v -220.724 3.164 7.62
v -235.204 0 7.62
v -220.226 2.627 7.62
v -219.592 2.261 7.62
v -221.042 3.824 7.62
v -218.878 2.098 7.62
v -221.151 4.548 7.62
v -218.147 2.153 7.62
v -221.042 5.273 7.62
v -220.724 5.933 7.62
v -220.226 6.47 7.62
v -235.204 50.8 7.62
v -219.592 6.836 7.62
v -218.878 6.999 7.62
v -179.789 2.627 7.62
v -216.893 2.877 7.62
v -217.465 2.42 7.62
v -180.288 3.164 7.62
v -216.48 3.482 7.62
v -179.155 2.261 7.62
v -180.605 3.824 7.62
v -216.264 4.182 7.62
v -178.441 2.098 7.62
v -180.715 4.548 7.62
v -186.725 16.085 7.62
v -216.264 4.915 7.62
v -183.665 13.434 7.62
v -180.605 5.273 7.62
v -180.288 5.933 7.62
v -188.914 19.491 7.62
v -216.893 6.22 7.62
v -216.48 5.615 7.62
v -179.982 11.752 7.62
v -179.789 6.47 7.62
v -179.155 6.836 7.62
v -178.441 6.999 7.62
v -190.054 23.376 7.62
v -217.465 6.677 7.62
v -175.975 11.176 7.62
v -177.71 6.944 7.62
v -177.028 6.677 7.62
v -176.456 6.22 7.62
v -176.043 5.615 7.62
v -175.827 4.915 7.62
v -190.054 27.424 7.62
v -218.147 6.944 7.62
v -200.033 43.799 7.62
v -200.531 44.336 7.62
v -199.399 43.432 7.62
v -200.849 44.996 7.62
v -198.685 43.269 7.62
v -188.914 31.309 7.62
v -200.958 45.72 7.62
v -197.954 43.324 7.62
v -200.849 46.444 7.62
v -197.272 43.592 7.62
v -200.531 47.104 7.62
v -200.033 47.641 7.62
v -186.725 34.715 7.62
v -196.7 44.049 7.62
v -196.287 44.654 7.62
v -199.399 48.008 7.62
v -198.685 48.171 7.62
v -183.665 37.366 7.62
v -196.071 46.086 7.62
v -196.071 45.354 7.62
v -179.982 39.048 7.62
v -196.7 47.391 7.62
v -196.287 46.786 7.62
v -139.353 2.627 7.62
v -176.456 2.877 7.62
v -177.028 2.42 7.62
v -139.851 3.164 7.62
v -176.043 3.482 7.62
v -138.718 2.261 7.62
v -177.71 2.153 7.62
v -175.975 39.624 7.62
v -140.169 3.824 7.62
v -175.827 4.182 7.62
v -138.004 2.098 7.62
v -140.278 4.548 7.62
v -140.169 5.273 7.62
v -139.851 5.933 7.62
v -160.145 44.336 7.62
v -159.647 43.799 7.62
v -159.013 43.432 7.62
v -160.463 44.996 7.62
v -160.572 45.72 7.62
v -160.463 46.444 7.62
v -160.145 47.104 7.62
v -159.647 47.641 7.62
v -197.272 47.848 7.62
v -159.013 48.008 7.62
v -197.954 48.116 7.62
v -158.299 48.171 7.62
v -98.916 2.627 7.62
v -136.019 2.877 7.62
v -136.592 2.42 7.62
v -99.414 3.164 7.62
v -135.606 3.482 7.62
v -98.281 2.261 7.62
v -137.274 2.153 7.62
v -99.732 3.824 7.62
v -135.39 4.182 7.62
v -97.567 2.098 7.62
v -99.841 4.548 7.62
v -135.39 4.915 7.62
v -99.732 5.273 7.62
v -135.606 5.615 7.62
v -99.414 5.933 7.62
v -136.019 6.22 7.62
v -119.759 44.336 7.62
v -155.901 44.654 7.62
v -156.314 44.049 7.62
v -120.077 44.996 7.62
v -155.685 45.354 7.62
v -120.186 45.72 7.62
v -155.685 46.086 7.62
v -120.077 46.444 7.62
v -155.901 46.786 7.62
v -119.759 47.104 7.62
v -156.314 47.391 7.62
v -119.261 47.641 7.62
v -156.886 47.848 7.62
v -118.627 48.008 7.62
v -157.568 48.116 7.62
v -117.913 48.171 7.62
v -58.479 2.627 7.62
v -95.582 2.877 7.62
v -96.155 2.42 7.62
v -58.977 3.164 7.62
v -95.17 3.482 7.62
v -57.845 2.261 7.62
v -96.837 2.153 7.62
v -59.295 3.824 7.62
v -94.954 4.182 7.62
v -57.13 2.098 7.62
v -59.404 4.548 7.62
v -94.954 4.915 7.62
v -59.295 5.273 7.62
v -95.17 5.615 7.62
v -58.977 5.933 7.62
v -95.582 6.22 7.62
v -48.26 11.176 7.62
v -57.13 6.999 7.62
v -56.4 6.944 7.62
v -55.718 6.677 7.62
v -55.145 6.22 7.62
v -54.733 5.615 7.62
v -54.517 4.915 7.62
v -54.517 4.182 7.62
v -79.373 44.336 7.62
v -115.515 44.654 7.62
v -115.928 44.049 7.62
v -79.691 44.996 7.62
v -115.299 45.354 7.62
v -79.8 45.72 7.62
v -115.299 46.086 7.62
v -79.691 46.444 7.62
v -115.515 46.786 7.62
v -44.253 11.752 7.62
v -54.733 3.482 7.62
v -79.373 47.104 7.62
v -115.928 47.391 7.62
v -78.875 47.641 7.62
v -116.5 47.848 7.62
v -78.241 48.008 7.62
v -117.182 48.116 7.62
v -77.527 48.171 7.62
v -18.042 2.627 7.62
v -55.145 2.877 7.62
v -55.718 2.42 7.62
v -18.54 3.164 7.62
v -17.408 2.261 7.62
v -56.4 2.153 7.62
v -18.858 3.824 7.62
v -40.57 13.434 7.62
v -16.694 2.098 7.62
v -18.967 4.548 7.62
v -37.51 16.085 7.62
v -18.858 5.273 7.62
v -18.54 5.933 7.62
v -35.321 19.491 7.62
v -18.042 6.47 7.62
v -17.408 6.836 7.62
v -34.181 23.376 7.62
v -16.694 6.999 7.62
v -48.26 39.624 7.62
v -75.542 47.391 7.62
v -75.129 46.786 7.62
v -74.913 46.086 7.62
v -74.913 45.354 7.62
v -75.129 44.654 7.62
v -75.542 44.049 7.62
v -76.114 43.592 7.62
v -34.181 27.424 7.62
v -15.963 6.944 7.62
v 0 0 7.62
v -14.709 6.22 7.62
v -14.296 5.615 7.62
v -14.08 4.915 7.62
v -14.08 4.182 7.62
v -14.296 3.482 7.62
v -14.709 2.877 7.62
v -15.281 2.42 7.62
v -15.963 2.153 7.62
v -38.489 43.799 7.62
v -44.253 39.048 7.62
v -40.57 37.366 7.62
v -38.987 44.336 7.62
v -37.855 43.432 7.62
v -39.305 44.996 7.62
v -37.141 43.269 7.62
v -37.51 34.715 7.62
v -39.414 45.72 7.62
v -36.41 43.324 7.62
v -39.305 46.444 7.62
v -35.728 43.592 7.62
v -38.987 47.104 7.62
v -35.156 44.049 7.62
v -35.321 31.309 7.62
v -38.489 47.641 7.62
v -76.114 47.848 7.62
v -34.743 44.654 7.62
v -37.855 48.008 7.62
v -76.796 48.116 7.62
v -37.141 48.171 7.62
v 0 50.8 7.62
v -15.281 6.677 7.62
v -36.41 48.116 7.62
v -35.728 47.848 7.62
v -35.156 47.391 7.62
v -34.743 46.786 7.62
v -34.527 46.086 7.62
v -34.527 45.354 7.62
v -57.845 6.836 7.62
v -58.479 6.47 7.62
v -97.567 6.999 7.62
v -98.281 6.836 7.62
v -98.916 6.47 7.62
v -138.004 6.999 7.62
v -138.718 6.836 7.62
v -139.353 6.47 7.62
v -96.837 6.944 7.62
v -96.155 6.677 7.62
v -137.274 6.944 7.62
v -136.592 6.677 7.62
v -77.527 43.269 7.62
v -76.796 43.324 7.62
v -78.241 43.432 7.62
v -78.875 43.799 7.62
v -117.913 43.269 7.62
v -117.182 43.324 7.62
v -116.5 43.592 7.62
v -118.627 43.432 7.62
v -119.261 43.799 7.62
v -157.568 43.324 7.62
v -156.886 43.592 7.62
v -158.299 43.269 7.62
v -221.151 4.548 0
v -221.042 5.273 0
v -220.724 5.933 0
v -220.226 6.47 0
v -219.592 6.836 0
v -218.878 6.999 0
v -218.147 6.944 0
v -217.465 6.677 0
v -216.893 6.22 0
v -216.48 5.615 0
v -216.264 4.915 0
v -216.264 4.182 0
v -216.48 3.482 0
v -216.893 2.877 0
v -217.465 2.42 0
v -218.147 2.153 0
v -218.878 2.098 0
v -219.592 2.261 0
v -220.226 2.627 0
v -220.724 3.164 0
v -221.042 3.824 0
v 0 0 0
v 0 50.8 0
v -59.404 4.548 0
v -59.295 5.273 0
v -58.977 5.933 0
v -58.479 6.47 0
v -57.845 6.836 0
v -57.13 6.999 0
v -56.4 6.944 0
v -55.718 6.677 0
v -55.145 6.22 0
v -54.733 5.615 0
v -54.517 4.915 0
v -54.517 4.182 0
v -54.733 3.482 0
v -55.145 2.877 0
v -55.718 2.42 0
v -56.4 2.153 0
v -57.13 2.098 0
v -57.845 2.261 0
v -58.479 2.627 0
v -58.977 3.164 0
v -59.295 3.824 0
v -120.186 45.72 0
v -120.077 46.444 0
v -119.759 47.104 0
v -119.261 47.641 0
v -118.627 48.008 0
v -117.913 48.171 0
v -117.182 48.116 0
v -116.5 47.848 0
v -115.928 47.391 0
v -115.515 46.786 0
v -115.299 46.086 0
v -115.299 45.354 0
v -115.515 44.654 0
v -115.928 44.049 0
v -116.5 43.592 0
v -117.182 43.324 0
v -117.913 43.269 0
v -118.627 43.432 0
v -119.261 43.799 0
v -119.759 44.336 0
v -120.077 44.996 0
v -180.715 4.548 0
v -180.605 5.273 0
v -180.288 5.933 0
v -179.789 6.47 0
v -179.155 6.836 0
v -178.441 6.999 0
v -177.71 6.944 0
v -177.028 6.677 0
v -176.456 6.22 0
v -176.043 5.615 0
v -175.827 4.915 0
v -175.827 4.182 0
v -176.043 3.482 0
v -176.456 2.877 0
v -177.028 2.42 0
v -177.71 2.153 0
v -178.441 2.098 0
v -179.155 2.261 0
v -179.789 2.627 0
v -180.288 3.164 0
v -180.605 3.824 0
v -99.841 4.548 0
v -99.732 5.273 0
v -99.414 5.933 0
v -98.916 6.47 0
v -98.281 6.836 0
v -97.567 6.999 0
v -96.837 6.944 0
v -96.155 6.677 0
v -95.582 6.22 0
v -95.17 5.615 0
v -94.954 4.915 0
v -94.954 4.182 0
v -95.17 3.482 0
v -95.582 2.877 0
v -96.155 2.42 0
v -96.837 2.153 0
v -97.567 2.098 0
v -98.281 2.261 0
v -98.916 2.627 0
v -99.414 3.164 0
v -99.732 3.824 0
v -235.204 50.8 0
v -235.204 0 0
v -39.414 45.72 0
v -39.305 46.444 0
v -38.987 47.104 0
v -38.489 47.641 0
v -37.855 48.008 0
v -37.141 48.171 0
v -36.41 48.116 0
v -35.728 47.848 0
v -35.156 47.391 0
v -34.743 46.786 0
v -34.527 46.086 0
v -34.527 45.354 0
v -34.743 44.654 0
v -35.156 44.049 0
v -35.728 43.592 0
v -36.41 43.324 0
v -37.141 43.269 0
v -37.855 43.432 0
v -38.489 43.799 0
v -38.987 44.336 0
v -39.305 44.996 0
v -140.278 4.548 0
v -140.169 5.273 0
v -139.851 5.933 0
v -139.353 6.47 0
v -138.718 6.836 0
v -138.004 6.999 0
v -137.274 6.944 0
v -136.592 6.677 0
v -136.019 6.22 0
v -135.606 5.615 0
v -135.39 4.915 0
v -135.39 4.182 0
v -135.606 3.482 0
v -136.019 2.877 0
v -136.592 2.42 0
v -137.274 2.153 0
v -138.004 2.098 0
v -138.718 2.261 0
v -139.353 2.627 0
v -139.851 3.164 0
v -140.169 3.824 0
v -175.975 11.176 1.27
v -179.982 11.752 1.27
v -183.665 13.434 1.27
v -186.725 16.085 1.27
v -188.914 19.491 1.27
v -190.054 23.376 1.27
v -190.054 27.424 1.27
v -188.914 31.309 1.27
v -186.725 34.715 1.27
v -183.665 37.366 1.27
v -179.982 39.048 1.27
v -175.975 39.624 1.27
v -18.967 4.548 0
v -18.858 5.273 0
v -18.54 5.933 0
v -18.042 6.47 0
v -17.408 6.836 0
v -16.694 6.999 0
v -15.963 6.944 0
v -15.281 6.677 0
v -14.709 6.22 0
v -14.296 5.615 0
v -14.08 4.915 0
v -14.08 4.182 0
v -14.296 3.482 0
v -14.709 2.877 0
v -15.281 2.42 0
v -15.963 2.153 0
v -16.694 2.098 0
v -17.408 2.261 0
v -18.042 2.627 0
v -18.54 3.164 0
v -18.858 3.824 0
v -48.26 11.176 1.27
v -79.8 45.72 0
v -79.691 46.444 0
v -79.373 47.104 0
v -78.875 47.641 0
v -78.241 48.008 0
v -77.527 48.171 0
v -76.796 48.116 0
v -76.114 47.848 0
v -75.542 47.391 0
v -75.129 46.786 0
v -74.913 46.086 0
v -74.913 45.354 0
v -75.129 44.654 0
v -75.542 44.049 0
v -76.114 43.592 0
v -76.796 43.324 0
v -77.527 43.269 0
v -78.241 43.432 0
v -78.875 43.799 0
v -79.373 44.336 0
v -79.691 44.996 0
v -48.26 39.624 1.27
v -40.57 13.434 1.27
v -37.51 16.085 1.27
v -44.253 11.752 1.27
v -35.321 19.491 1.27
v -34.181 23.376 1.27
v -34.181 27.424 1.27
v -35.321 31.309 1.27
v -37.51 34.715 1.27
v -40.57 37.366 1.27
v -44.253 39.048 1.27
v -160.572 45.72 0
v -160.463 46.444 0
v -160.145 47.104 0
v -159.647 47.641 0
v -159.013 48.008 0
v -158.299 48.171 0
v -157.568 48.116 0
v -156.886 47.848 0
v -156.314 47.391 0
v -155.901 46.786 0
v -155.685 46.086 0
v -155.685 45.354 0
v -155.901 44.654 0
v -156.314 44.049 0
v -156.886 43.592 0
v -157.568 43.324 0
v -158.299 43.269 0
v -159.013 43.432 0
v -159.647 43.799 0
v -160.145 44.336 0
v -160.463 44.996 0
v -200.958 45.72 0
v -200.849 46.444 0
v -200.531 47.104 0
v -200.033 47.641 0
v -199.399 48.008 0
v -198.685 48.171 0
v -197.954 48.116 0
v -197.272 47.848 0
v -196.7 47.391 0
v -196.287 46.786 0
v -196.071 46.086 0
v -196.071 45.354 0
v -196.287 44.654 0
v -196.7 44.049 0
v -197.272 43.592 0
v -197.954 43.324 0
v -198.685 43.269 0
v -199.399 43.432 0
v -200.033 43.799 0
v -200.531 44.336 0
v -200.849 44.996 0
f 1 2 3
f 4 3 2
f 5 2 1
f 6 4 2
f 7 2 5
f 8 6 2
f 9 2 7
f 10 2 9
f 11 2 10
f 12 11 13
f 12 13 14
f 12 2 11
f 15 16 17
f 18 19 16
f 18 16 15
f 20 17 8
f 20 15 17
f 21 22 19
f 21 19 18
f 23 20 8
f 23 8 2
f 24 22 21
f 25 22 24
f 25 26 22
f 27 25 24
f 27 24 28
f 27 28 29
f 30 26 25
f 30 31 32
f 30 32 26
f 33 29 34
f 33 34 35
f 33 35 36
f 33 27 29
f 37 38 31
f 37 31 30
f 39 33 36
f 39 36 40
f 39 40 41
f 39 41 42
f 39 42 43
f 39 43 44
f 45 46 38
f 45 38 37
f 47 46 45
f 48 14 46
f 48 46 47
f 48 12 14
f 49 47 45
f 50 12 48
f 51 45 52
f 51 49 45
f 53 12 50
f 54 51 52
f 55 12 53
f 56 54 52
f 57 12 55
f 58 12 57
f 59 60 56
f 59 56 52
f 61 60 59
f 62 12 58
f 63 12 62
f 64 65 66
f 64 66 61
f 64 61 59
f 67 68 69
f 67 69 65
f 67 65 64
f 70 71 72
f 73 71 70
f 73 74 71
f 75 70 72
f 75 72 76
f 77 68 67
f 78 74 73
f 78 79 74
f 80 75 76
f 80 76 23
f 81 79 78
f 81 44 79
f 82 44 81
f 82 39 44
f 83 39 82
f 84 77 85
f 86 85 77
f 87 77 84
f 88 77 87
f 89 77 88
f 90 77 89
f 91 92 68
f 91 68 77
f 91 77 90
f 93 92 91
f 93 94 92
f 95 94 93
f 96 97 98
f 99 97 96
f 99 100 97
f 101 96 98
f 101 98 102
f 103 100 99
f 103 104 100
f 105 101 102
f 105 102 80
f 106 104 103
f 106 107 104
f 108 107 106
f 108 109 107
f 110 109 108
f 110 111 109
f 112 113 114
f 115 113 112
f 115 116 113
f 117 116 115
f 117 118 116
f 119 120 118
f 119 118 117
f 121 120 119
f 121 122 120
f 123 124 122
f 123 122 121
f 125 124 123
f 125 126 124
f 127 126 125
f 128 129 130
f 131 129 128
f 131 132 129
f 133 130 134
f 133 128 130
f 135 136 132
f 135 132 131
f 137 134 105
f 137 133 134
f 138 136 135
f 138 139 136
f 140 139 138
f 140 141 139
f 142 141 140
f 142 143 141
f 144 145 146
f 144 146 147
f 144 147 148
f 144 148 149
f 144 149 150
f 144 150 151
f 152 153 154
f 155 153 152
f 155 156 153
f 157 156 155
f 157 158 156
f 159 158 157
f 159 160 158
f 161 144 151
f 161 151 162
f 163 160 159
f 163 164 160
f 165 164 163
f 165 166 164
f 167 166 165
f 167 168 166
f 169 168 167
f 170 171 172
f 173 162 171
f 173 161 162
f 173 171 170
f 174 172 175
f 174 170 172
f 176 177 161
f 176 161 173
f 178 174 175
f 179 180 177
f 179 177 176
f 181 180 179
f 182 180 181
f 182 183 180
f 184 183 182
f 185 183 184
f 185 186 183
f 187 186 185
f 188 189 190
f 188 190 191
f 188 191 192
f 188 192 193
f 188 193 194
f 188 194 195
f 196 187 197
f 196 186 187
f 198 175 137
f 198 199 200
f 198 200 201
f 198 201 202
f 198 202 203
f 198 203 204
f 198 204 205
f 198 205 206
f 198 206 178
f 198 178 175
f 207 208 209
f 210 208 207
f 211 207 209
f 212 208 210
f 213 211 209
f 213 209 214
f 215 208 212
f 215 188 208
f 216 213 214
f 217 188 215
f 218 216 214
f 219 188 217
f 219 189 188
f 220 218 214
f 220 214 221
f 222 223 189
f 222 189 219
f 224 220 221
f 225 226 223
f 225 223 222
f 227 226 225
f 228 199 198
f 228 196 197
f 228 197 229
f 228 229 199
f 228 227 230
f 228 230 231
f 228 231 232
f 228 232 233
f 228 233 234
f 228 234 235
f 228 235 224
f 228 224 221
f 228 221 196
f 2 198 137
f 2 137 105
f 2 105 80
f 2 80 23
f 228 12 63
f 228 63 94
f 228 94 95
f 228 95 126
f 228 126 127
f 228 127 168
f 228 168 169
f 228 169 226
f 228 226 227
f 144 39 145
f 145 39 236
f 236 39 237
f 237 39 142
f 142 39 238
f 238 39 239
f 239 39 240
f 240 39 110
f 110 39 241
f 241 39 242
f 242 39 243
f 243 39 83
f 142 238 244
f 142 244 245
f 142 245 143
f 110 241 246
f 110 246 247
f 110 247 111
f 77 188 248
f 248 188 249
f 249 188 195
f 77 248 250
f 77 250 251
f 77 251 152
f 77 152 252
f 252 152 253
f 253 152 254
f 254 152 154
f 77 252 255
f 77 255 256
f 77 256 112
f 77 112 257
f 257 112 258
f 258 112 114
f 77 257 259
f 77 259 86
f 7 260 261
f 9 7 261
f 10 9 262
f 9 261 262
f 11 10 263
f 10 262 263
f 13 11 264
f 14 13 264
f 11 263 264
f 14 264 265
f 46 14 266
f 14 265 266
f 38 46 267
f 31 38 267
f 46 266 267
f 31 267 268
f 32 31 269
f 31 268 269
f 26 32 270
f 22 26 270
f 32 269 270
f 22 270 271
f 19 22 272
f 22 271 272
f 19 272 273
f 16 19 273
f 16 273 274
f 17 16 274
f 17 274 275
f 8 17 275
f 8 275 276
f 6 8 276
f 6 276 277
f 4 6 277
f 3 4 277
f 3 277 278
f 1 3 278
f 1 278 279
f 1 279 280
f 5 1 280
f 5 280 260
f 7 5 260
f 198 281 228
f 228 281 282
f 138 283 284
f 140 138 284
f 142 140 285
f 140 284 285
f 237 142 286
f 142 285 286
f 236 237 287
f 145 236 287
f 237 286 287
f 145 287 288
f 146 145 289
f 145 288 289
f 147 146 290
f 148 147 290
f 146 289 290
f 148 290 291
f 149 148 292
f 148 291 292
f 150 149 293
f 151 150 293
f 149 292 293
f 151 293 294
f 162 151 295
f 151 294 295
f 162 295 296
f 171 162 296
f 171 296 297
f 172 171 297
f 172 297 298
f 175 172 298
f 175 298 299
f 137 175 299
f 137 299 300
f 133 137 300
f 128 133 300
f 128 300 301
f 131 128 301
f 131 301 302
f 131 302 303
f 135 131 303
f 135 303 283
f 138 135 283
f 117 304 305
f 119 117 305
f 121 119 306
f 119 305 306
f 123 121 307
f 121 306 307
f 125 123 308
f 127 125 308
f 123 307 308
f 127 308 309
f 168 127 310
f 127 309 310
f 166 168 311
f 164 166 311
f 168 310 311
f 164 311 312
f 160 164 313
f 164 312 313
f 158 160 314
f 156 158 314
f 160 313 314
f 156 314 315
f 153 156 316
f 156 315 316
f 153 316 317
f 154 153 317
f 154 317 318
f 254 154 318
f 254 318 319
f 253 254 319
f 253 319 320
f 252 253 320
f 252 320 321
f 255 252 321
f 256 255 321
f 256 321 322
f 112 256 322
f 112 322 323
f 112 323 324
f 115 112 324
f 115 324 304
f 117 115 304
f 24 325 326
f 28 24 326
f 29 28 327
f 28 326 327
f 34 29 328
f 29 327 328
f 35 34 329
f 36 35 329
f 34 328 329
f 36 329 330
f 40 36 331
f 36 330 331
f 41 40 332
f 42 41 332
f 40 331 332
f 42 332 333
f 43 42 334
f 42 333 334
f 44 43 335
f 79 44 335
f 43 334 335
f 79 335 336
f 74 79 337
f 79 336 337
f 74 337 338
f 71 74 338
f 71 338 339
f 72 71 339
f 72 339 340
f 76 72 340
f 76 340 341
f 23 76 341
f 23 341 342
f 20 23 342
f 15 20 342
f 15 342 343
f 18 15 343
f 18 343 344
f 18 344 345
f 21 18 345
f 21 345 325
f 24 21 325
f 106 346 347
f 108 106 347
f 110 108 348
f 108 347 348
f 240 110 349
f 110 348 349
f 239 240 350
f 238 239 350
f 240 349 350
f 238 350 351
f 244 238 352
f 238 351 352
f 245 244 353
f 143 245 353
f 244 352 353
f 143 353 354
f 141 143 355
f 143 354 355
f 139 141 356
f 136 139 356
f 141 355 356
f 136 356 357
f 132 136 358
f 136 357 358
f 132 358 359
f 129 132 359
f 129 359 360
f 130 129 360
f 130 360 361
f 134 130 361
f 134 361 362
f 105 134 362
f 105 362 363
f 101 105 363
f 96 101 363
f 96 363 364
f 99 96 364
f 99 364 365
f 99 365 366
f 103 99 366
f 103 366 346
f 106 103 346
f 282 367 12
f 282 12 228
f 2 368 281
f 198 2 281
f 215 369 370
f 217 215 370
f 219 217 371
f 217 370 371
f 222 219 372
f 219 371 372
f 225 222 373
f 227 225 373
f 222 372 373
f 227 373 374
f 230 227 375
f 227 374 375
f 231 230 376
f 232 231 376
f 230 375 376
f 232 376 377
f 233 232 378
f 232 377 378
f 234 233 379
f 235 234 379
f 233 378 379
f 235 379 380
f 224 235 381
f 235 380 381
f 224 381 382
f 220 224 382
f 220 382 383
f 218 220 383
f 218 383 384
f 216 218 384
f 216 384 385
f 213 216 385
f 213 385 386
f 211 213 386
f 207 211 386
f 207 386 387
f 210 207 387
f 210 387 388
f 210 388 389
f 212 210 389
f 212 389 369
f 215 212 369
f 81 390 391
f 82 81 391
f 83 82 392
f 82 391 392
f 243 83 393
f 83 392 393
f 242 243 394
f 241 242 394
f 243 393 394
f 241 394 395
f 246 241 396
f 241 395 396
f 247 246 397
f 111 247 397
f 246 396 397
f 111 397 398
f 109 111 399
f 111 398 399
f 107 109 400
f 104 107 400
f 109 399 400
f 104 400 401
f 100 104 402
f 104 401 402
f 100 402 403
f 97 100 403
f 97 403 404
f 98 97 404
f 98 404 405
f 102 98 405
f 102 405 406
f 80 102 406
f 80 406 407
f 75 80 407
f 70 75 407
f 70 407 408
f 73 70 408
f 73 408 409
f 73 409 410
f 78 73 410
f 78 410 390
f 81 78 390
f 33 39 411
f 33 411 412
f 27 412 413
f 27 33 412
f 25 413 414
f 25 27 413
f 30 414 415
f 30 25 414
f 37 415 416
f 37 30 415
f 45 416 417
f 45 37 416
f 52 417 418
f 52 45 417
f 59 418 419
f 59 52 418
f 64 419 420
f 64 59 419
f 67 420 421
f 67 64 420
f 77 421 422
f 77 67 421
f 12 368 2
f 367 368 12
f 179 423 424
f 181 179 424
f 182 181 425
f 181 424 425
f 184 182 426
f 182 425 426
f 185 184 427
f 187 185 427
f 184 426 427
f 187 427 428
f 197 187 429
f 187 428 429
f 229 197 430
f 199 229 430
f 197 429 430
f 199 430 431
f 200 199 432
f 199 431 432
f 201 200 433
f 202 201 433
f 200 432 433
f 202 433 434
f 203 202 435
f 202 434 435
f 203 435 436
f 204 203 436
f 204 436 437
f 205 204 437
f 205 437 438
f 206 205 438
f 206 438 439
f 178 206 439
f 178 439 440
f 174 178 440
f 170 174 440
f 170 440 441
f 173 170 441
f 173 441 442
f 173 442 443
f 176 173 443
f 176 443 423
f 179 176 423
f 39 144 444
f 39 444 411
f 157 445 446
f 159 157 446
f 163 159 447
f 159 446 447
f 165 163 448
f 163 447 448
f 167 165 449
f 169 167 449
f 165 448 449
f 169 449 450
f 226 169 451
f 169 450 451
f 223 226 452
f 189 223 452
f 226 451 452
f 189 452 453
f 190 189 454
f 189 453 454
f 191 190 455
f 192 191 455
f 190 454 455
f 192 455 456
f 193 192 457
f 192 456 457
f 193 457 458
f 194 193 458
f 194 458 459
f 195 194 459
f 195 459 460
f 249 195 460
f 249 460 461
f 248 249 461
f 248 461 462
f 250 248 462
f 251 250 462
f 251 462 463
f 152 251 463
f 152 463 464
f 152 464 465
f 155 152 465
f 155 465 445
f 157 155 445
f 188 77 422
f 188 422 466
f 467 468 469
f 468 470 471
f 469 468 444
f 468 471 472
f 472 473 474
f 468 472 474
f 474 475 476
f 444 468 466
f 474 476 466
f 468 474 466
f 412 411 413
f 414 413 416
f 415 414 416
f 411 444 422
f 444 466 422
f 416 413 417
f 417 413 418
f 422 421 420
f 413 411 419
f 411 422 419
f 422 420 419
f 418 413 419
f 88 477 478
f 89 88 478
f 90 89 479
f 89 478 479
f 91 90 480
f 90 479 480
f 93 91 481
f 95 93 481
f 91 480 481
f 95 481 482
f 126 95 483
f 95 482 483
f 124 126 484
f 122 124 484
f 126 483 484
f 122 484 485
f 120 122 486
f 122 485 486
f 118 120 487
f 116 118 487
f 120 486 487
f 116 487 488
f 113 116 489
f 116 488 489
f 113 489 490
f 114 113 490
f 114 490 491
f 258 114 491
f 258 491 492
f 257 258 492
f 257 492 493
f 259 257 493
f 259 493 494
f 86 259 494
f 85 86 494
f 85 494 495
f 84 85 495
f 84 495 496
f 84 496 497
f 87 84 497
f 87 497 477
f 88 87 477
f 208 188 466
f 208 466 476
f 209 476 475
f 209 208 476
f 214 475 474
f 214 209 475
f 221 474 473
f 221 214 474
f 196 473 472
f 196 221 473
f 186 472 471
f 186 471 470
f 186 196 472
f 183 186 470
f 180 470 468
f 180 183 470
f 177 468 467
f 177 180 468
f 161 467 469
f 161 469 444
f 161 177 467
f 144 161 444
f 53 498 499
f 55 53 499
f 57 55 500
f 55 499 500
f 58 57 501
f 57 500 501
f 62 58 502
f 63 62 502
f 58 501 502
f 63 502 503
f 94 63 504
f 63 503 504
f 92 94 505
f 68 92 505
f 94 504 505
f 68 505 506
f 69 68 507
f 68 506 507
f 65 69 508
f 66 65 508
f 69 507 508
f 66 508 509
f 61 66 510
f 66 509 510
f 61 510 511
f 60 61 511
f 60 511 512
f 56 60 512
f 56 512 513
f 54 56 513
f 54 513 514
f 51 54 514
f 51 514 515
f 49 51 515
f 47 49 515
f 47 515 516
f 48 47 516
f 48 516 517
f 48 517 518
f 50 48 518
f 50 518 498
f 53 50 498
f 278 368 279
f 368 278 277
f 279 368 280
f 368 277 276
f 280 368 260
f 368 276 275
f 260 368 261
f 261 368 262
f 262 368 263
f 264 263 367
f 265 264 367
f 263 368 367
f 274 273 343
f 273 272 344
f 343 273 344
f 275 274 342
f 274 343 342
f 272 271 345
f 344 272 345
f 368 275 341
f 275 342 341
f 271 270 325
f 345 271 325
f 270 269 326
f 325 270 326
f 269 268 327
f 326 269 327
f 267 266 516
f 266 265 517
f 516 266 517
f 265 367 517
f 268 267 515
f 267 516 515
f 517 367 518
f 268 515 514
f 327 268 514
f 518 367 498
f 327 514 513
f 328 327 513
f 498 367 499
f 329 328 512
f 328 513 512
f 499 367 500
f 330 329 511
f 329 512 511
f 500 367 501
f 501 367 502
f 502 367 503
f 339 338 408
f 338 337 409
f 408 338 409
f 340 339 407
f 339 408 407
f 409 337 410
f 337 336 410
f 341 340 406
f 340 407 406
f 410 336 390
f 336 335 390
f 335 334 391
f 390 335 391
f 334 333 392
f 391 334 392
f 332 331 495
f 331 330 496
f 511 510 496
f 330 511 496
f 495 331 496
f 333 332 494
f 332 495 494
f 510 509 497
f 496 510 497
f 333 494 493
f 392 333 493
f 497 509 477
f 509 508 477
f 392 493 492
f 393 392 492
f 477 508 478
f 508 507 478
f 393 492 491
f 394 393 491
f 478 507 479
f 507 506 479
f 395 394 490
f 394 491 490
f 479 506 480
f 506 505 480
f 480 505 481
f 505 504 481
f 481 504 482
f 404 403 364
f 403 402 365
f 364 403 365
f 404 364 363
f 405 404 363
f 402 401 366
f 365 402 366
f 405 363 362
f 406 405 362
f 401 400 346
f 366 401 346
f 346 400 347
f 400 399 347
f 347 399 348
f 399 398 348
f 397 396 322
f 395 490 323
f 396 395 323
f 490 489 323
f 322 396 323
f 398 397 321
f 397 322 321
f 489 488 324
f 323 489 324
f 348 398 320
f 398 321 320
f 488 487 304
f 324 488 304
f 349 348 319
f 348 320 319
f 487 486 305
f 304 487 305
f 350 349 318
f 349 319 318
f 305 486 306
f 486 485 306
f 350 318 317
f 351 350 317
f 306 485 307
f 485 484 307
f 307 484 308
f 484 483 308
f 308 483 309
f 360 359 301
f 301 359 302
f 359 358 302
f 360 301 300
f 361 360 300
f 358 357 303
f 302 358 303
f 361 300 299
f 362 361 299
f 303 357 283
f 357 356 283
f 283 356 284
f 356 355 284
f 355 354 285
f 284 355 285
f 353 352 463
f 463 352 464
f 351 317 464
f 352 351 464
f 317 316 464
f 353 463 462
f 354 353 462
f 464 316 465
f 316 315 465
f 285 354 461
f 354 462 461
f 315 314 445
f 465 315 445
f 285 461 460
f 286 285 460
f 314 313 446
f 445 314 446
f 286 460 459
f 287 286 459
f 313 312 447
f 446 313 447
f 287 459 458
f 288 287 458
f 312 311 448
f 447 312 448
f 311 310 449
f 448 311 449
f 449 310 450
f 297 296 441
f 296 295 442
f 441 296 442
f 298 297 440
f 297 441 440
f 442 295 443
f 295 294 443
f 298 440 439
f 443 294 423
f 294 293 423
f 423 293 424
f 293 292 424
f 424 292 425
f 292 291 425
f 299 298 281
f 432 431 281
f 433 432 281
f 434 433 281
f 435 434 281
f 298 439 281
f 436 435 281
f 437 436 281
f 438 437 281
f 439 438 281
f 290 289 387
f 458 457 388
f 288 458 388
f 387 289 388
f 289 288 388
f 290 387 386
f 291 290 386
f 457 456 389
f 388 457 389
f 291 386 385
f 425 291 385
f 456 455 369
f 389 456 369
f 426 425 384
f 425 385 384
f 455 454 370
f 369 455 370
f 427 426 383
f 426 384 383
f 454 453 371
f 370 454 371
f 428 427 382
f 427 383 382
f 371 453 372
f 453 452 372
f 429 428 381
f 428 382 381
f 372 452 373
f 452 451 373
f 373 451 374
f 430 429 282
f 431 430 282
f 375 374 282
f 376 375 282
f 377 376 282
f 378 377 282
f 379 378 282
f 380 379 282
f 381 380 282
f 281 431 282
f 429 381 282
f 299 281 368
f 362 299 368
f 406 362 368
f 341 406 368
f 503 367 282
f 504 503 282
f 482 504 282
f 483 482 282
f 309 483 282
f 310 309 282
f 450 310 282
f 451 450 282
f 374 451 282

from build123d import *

# Parameters (mm, degrees)
SKETCH5_W                    = 235.204
SKETCH5_H                    = 50.8
BOSS_EXTRUDE3_DEPTH          = 7.62
CUT_EXTRUDE3_DEPTH           = 6.35
F_10_0_1935_DIAMETER_HOLE1_D = 4.9149


with BuildPart() as part:
    # Sketch5 → Boss-Extrude3 (new body)
    with BuildSketch(Plane.XY):
        with Locations((-117.602, 25.4)):
            Rectangle(SKETCH5_W, SKETCH5_H)
    extrude(amount=BOSS_EXTRUDE3_DEPTH)

    # Sketch6 → Cut-Extrude3 (cut)
    with BuildSketch(Plane.XY.offset(7.62)):
        with BuildLine():
            Line((-48.26, 11.176), (-175.975043584, 11.176))
            ThreePointArc((-175.975043584, 11.176), (-190.199043584, 25.4), (-175.975043584, 39.624))
            Line((-175.975043584, 39.624), (-48.26, 39.624))
            ThreePointArc((-48.26, 39.624), (-34.036, 25.4), (-48.26, 11.176))
        make_face()
    extrude(amount=-CUT_EXTRUDE3_DEPTH, mode=Mode.SUBTRACT)

    # #10 (0.1935) Diameter Hole1 (through all)
    with Locations(Plane(origin=(-198.501, 45.72, 7.62), x_dir=(1, 0, 0), z_dir=(0, 0, 1))):
        with Locations((0, 0), (40.386, 0), (80.772, 0), (121.158, 0), (161.544, 0), (-20.193, -41.171520692), (20.2438, -41.171520692), (60.6806, -41.171520692), (101.1174, -41.171520692), (141.5542, -41.171520692), (181.991, -41.171520692)):
            Hole(F_10_0_1935_DIAMETER_HOLE1_D / 2)


solid = part.part
